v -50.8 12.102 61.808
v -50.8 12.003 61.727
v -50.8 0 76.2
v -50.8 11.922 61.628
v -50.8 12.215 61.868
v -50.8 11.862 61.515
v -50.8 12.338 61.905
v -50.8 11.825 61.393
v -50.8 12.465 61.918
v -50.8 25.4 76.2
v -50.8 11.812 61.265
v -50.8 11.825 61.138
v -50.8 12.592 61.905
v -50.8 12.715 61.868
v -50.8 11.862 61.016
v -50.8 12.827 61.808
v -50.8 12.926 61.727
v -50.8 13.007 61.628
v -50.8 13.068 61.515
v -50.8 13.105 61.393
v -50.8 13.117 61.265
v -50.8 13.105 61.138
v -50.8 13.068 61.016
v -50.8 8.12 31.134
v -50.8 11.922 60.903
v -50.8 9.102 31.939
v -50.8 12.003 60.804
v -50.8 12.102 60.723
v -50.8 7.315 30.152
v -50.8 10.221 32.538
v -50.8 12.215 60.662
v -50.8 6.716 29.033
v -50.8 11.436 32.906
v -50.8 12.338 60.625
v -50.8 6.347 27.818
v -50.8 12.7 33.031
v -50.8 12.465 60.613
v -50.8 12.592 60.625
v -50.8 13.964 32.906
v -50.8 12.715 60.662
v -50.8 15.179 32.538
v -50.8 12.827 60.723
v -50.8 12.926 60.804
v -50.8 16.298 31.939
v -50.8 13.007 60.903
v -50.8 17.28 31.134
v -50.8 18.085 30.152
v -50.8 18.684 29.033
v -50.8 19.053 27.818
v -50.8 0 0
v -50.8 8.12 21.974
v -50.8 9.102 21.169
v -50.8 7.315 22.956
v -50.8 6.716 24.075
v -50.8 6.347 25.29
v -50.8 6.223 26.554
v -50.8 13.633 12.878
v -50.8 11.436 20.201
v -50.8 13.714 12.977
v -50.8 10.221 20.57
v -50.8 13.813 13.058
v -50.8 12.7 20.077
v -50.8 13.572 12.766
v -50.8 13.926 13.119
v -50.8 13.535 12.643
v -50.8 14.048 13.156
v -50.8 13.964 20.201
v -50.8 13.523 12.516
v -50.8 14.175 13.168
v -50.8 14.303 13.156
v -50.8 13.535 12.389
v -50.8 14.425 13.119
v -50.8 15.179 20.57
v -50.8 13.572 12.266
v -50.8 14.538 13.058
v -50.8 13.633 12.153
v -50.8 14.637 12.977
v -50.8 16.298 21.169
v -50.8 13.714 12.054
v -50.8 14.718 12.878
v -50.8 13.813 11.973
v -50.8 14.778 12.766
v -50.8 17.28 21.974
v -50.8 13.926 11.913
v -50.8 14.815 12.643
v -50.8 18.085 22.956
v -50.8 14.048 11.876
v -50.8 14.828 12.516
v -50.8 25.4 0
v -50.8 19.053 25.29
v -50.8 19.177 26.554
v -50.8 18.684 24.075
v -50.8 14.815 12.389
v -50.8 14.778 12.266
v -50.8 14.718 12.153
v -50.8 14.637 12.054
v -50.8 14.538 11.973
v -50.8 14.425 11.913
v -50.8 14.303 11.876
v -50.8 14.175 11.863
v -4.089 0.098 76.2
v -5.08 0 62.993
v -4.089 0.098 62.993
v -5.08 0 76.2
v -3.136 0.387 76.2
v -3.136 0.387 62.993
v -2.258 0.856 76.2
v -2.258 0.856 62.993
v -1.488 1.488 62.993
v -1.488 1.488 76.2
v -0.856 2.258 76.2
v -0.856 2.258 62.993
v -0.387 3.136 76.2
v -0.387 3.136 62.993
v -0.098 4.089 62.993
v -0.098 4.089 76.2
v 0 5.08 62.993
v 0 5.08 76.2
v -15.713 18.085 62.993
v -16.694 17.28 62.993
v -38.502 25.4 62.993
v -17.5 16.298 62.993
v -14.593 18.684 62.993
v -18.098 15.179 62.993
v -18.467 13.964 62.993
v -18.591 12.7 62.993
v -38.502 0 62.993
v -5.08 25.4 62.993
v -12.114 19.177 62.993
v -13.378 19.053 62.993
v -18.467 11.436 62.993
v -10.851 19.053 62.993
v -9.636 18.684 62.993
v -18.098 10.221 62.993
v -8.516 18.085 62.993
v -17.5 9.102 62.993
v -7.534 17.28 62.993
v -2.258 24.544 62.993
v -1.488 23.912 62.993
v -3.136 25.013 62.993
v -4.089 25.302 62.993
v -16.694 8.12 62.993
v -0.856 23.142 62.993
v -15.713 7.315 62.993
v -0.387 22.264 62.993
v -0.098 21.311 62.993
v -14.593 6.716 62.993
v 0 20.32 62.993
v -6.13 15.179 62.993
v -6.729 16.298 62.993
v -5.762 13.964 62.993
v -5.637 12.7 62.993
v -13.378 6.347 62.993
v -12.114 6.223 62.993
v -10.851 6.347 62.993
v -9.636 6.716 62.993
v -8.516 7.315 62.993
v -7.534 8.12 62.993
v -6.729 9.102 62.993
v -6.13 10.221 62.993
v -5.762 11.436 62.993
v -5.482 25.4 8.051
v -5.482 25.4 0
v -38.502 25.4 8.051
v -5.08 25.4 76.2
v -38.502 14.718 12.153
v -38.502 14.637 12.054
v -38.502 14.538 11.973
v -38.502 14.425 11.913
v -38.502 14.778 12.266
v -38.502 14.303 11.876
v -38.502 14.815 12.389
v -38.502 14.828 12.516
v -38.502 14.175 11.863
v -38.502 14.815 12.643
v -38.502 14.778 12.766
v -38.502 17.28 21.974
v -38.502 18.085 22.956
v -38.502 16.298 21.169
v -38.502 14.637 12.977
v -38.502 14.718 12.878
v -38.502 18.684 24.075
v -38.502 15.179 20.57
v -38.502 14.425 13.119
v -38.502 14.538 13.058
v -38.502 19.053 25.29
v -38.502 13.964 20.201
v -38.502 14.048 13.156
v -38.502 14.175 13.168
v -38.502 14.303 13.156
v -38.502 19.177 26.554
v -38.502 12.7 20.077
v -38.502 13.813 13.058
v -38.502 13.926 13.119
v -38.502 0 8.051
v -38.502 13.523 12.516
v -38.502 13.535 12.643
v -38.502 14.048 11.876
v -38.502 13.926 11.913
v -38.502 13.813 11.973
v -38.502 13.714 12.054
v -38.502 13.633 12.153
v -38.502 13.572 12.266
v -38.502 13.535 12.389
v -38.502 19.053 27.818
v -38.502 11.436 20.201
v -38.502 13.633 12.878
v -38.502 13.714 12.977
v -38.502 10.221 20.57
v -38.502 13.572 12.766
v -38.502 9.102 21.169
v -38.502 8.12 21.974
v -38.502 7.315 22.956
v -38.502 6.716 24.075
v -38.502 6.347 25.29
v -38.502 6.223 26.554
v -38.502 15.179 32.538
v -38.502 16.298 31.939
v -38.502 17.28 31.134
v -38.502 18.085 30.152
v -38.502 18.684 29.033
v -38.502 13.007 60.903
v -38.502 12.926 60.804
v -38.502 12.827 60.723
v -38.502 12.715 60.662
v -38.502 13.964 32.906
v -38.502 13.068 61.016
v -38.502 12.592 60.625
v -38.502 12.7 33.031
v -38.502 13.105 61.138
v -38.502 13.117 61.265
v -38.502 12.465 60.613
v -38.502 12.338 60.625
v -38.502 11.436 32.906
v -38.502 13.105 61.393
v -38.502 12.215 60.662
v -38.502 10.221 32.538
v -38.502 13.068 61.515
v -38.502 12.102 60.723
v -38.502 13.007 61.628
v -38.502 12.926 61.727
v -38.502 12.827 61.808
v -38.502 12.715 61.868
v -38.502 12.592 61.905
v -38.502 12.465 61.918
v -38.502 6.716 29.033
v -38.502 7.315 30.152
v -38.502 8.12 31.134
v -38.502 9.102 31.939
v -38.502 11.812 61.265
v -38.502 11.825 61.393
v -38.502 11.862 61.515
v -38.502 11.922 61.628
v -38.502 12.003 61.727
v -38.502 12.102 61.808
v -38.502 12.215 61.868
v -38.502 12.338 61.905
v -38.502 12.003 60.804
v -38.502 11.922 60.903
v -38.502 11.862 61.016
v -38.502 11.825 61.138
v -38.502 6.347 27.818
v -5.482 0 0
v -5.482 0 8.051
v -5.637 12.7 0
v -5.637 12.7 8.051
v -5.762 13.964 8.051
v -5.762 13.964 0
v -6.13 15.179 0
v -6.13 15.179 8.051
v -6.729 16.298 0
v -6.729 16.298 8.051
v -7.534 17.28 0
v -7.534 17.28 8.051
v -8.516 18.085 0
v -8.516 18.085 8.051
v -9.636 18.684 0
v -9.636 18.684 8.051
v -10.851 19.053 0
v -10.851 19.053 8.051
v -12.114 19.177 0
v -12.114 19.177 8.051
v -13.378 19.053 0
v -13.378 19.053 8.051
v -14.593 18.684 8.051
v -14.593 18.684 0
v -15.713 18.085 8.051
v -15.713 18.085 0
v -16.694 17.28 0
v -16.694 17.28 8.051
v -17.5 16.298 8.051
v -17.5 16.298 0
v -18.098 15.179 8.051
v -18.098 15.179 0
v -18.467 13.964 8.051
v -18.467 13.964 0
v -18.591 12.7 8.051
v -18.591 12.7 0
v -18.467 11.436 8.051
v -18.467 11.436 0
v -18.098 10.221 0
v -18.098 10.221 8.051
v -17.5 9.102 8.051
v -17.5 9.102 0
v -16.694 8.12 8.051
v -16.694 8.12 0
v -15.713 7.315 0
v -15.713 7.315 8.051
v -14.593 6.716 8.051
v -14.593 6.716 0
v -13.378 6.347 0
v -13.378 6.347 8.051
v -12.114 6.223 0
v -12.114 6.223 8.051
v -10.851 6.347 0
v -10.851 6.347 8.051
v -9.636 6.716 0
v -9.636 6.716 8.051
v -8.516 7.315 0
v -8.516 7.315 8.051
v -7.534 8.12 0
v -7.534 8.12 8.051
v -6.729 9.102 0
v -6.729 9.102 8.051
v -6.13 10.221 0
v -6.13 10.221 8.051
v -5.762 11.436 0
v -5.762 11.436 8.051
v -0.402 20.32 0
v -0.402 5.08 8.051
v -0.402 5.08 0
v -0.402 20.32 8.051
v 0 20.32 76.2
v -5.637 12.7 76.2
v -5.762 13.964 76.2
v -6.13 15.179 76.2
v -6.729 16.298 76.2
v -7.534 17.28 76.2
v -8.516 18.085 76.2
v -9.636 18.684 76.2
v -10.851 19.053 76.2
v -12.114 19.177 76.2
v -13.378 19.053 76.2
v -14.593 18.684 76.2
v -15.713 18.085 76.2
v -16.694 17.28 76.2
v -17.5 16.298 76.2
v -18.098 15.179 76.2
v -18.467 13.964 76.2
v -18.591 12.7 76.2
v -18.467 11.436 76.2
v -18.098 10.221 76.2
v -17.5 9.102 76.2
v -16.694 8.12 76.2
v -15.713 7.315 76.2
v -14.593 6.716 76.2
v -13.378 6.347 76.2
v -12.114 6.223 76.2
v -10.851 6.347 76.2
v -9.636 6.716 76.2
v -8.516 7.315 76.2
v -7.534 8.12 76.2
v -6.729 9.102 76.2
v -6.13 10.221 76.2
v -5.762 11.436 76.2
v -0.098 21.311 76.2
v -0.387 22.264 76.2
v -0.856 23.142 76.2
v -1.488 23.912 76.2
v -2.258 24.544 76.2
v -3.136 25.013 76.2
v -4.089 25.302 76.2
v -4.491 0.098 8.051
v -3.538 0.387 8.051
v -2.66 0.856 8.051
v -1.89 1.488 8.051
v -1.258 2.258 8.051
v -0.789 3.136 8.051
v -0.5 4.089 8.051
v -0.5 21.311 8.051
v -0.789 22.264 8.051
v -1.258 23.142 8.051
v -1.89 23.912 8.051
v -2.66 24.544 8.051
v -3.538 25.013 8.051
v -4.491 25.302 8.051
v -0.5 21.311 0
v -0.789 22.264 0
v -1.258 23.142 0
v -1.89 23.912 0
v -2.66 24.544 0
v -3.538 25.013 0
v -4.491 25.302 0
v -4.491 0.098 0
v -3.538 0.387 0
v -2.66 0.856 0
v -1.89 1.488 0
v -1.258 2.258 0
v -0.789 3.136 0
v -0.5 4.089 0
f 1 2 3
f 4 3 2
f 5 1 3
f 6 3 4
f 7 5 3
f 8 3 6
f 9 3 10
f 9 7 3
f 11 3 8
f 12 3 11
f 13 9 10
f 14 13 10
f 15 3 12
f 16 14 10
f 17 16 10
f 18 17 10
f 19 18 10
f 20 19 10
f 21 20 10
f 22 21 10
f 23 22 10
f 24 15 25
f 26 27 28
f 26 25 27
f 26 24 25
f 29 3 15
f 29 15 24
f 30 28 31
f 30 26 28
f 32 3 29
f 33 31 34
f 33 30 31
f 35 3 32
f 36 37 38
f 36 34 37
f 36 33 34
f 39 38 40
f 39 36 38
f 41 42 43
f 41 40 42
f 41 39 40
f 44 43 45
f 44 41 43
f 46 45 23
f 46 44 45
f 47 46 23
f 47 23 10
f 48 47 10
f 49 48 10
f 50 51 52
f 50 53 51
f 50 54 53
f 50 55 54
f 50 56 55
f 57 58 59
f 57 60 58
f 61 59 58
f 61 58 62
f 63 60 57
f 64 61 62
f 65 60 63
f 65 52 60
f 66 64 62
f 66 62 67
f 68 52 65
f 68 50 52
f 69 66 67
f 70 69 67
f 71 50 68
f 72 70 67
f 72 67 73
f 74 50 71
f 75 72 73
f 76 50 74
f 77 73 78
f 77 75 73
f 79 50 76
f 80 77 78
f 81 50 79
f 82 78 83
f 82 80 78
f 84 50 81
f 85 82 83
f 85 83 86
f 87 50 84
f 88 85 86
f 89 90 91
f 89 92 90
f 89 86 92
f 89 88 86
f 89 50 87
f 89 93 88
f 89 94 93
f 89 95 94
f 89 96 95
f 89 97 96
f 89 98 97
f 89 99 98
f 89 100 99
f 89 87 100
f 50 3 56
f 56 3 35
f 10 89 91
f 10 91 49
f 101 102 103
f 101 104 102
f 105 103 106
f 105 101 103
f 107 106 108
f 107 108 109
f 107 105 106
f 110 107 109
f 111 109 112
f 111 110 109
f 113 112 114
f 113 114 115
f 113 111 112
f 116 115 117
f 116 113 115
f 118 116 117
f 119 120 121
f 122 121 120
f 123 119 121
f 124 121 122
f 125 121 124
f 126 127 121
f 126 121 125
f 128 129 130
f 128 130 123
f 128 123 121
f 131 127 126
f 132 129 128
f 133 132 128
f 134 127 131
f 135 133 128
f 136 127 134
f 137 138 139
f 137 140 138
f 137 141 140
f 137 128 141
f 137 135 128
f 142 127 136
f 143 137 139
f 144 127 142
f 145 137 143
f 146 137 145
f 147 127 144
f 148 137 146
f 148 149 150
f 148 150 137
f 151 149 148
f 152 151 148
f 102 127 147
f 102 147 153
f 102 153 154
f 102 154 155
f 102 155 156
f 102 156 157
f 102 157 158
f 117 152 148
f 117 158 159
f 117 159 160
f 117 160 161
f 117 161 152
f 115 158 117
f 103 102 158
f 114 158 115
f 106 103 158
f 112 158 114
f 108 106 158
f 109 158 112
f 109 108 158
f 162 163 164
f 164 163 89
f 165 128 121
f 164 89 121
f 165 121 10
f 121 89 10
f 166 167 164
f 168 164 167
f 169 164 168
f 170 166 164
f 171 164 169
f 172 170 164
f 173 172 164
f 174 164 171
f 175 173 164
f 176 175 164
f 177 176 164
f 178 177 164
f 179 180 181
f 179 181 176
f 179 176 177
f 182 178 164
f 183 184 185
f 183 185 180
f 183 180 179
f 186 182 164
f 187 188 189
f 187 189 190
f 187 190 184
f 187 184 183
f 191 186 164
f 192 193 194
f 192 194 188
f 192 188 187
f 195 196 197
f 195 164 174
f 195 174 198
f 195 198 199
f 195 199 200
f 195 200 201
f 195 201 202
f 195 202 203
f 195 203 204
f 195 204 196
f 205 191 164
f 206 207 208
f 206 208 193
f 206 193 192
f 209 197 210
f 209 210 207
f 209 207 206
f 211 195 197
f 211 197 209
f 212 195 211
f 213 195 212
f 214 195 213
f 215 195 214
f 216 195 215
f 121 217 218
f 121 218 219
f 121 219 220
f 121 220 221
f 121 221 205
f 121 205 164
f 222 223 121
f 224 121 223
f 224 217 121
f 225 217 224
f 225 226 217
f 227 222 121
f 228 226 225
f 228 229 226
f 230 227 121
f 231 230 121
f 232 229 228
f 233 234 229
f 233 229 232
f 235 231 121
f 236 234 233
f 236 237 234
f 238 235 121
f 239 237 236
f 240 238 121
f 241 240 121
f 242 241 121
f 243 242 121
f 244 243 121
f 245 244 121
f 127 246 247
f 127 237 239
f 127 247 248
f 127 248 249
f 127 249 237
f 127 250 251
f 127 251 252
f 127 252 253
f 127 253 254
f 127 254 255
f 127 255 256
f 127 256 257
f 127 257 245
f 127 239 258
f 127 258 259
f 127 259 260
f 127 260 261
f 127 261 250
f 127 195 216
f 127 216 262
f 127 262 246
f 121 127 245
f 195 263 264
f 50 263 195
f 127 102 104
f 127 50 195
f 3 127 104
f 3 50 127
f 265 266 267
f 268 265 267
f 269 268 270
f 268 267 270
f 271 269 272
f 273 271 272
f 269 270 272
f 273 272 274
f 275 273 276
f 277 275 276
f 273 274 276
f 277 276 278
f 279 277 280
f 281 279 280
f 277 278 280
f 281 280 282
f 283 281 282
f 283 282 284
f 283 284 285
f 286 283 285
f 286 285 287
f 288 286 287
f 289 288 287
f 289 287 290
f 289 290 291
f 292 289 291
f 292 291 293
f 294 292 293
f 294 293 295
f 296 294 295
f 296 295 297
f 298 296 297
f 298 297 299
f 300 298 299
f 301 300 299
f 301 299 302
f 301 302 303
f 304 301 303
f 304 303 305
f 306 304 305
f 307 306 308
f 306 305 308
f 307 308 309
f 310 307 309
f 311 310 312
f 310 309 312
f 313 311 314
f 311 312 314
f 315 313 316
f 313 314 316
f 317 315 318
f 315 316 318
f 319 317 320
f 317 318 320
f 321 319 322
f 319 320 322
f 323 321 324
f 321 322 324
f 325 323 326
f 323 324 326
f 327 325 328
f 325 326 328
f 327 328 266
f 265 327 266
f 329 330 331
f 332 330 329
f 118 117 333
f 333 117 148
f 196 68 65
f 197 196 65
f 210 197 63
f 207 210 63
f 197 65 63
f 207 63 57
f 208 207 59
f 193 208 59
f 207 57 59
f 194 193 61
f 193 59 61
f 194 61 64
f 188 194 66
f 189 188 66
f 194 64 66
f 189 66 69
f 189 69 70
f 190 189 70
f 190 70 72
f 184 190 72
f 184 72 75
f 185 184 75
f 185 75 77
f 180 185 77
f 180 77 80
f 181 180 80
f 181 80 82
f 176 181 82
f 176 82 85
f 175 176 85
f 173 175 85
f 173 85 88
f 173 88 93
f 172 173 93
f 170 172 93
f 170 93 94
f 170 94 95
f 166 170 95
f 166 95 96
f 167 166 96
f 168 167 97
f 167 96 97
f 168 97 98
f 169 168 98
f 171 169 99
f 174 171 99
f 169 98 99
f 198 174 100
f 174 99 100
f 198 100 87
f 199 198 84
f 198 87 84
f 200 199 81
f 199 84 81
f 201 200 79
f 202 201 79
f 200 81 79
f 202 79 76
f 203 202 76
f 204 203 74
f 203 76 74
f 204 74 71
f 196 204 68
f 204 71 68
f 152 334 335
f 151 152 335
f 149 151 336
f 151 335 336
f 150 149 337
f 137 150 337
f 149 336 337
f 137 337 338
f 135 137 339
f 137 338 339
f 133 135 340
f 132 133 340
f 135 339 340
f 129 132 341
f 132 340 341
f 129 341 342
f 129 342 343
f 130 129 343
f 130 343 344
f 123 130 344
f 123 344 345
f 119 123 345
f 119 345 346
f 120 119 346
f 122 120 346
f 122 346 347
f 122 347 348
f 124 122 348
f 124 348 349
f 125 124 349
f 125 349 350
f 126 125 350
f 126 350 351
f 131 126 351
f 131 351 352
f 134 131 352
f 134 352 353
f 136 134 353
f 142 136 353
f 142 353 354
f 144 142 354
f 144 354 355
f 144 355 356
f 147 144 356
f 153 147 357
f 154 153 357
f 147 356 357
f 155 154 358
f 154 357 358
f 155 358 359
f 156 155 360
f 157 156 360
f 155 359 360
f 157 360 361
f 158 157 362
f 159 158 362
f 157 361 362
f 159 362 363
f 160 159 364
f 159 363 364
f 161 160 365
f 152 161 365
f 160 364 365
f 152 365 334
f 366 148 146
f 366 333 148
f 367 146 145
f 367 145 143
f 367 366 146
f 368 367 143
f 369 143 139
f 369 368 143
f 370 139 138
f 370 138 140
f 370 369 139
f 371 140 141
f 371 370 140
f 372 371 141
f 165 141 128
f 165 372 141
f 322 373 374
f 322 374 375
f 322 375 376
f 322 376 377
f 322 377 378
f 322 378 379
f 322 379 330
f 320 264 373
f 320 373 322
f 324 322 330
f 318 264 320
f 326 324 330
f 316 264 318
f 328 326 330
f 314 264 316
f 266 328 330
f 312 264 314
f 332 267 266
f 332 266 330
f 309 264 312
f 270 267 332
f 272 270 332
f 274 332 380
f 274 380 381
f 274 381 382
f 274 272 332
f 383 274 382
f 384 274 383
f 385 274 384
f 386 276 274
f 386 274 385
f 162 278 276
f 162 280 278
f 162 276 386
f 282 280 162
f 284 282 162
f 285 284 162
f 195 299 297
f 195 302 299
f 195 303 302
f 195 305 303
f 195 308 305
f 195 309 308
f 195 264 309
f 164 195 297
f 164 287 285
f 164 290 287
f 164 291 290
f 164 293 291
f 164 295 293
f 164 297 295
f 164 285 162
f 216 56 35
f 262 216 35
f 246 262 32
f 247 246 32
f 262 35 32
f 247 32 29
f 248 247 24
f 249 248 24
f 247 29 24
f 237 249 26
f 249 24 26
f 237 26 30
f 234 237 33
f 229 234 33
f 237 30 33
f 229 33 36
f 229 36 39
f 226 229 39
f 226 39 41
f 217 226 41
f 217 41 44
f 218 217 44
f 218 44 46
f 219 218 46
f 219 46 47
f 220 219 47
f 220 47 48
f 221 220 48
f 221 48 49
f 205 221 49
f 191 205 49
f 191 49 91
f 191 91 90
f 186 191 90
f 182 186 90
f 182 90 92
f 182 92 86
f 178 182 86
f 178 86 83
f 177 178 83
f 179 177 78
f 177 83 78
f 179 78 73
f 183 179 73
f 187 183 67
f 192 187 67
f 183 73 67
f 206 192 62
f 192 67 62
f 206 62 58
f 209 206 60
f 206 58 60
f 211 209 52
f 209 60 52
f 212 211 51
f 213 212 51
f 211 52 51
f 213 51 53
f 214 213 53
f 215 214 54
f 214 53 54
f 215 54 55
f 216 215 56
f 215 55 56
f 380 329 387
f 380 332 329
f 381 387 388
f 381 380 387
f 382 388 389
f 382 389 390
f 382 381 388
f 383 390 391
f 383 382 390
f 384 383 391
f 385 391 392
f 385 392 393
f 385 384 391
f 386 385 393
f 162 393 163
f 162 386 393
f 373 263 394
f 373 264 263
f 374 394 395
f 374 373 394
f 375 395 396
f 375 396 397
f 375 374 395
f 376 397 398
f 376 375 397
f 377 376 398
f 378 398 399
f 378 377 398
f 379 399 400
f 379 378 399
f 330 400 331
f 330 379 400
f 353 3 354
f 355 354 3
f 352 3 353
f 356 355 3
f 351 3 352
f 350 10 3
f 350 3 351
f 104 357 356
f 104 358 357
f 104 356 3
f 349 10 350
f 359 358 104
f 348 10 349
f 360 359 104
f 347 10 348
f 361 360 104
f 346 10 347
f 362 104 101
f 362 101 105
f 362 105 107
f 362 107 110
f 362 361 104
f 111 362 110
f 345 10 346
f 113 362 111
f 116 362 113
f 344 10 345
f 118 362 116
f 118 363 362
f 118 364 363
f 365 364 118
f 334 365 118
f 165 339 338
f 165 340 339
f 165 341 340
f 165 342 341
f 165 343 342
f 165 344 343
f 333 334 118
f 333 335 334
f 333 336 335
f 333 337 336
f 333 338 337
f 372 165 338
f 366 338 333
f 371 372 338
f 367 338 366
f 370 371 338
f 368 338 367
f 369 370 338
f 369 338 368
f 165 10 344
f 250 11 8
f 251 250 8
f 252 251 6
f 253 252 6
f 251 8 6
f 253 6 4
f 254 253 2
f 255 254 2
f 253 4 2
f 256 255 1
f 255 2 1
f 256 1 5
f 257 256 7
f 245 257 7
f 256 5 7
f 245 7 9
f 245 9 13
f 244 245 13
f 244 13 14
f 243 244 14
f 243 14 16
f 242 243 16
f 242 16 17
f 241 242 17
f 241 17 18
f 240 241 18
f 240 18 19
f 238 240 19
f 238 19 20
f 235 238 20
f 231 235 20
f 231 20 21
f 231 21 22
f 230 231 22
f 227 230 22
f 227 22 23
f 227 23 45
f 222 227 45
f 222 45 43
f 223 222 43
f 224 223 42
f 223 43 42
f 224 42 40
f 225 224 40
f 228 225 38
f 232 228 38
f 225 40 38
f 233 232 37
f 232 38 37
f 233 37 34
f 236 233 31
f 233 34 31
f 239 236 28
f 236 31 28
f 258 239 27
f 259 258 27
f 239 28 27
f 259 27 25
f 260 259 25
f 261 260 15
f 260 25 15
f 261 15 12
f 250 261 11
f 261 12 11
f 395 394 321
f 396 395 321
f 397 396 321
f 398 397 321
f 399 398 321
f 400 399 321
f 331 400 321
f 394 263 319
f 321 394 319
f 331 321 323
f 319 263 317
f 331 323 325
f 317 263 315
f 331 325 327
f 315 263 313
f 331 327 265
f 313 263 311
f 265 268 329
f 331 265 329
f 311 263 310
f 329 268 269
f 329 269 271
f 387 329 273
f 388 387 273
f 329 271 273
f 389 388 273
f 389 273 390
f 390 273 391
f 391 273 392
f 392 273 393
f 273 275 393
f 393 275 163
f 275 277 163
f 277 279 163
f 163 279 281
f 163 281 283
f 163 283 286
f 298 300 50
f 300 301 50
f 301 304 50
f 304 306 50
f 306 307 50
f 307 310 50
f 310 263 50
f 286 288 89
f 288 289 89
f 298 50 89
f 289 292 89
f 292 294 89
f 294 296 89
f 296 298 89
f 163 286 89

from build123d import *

# Parameters (mm, degrees)
F0_W      = 50.8
F0_H      = 25.4
F1_DEPTH  = 76.2
F2_W      = 38.502306
F2_H      = 62.993251
F3_DEPTH  = 50.8
F5_R      = 6.477
F6_DEPTH  = 25.4
F7_W      = 25.4
F7_H      = 8.050508
F8_DEPTH  = 38.1
F4_R      = 6.477
F9_DEPTH  = 101.6
F10_R     = 5.08
F11_R     = 0.652616
F12_DEPTH = 25.4


with BuildPart() as f1:
    # F0 (on Top) → F1 (new body)
    with BuildSketch(Plane.XY):
        with Locations((-25.4, 12.7)):
            Rectangle(F0_W, F0_H)
    extrude(amount=F1_DEPTH)

    # F2 (on face) → F3 (cut)
    with BuildSketch(Plane.XZ):
        with Locations((-19.251153, 31.496625)):
            Rectangle(F2_W, F2_H)
    extrude(amount=-F3_DEPTH, mode=Mode.SUBTRACT)

    # F5 (on face) → F6 (cut)
    with BuildSketch(Plane(origin=(-50.8, 0, 0), x_dir=(0, -1, 0), z_dir=(-1, 0, 0))):
        with Locations((-12.7, 26.55393)):
            Circle(F5_R)
    extrude(amount=-F6_DEPTH, mode=Mode.SUBTRACT)

    # F7 (on face) → F8 (join)
    with BuildSketch(Plane.YZ.offset(-38.502306)):
        with Locations((12.7, 4.025254)):
            Rectangle(F7_W, F7_H)
    extrude(amount=F8_DEPTH)

    # F4 (on face) → F9 (cut)
    with BuildSketch(Plane.XY.offset(76.2)):
        with Locations((-12.11443, 12.7)):
            Circle(F4_R)
    extrude(amount=-F9_DEPTH, mode=Mode.SUBTRACT)

    # F10
    f10_edges = [f1.edges().sort_by_distance(p)[0] for p in [
        (0, 0, 69.596625),
        (-0.402306, 0, 4.025254),
        (-0.402306, 25.4, 4.025254),
        (0, 25.4, 69.596625),
    ]]
    fillet(f10_edges, radius=F10_R)

    # F11 (on face) → F12 (cut)
    with BuildSketch(Plane(origin=(-50.8, 0, 0), x_dir=(0, -1, 0), z_dir=(-1, 0, 0))):
        with Locations((-12.464834, 61.265279)):
            Circle(F11_R)
        with Locations((-14.175368, 12.515864)):
            Circle(F11_R)
    extrude(amount=-F12_DEPTH, mode=Mode.SUBTRACT)


solid = f1.part
